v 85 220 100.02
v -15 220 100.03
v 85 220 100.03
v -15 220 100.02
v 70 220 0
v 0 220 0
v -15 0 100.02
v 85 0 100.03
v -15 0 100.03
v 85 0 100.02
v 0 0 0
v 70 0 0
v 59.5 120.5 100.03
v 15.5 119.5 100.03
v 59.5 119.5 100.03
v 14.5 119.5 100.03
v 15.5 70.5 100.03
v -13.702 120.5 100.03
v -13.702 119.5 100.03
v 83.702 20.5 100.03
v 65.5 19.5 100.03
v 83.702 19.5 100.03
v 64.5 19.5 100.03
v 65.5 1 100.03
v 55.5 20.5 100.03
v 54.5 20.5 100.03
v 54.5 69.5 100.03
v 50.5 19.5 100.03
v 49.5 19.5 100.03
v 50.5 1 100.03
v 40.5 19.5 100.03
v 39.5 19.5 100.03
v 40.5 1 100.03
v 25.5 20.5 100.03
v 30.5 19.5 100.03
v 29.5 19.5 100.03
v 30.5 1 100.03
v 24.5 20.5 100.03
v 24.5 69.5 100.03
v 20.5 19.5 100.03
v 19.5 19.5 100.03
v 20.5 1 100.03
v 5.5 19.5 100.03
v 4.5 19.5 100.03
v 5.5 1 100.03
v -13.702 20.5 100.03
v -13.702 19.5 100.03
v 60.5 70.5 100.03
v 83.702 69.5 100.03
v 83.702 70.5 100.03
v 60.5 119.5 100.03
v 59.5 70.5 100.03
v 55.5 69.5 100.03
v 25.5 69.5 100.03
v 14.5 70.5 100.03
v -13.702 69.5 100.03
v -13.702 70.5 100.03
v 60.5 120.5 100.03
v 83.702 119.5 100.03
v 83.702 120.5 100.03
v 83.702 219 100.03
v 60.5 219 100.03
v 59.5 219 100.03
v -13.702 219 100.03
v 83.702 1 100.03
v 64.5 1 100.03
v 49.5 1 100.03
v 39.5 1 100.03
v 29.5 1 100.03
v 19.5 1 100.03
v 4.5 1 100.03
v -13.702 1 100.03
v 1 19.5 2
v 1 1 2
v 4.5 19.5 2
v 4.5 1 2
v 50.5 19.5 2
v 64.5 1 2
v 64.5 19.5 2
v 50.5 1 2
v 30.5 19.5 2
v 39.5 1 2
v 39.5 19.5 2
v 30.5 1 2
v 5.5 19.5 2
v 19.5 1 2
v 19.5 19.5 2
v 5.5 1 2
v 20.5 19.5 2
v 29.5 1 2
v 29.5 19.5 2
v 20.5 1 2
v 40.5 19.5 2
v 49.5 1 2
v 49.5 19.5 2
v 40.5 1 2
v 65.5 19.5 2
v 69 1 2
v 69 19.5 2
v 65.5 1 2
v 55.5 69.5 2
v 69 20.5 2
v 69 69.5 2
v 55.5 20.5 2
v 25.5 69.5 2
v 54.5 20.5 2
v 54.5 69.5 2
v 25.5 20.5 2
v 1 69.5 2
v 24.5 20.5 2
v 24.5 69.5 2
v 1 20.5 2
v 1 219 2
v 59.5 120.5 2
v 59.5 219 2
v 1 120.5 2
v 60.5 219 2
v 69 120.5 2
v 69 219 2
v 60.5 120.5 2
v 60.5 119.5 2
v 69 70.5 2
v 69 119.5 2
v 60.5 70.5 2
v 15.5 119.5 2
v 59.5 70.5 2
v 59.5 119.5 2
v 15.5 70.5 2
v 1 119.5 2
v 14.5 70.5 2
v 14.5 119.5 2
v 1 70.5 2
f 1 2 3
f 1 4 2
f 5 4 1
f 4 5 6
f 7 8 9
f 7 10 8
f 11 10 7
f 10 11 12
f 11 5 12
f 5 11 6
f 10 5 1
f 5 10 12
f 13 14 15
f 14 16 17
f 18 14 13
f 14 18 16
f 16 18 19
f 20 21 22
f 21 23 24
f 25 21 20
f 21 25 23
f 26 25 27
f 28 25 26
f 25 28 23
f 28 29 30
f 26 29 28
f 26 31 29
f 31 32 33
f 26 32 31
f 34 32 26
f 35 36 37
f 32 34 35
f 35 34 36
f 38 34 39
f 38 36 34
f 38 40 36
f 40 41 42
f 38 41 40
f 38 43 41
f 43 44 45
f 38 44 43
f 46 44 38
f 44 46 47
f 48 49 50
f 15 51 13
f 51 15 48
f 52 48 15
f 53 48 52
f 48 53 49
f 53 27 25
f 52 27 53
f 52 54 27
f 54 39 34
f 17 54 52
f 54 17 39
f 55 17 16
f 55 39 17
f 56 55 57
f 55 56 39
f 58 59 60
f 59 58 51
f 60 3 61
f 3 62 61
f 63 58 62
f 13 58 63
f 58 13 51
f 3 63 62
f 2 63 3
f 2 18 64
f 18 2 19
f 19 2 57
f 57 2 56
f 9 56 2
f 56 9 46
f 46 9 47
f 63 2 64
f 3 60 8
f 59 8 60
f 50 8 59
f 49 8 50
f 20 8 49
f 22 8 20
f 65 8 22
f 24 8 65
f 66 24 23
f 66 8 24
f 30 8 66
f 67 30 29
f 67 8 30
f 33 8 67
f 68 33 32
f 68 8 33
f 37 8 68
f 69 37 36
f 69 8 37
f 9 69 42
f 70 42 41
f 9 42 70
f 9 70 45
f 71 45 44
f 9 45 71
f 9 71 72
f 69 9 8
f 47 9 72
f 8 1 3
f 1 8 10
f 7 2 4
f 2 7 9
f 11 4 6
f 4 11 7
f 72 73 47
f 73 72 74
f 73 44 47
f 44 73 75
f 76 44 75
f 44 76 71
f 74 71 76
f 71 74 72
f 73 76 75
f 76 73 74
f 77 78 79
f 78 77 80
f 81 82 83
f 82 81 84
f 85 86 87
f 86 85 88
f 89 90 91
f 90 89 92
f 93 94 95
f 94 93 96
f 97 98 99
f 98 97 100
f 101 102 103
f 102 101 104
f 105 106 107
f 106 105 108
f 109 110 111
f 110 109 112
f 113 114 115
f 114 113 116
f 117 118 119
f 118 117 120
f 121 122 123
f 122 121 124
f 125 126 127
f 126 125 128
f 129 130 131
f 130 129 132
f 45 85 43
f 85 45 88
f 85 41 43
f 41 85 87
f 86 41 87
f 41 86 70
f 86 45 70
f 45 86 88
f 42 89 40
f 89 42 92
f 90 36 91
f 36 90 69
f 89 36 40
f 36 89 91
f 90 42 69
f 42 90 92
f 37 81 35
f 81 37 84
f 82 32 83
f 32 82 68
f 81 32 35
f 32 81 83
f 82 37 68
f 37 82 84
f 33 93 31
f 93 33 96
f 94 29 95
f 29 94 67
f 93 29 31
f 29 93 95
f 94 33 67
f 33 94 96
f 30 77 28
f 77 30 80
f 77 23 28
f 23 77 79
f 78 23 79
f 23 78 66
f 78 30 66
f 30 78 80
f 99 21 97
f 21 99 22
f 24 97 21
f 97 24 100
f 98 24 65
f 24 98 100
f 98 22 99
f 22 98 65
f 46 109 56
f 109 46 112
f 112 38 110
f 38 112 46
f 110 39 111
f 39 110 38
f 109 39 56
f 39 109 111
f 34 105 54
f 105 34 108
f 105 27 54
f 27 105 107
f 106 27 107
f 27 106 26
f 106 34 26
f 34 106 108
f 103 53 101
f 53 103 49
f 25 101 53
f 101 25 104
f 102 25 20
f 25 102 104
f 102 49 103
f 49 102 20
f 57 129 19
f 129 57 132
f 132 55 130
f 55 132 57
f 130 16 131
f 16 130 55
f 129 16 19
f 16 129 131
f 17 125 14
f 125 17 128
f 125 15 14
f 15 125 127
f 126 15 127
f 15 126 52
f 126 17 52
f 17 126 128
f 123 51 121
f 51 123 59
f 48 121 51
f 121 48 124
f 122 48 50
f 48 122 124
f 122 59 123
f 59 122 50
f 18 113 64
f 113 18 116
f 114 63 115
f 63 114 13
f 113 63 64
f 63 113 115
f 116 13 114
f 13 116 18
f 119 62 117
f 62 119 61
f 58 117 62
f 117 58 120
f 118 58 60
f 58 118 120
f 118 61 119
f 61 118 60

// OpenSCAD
// file: caddy_organizer_divider_common.scad
overlap=0.01;

/*
 * separate h,w for top and bottom defines the taper
 * centering defines whether the extra on top or bottom extends fully in the positive direction,
 * or extends equally in both directions.
 * flip***Wise shifts the larger end (top or bottom) in the negative direction so it
 * doesn't need to be mirrored & shifted externally.
 * clipBottomHeight cuts off the lower part of the box up to the height specified
 */
module taperedBox(bw, tw, bl, tl, ht, centerWidthwise=true, centerLengthwise=true, 
        flipWidthwise=false, flipLengthwise=false,
        clipBottomHeight=0) {
    extraWidth = abs(tw-bw);
    extraLength = abs(tl-bl);
    widerWidth = max(tw,bw);
    longerLength = max(tl,bl);
    // Don't shift if not centered and not flipped.
    // When centered
    // When not centered and flipped, shift negative direction
    topWidthShift = ((centerWidthwise) ? -(extraWidth/2) : ((flipWidthwise) ? -extraWidth : 0));
    topLengthShift = ((centerLengthwise) ? -(extraLength/2) : ((flipLengthwise) ? -extraLength : 0));
    echo(str("topWidthShift=",topWidthShift,", topLengthShift=",topLengthShift));
    difference() {
        hull() {
            translate([0,0,0]) 
                cube([bw,bl,overlap]);
            translate([topWidthShift,topLengthShift,ht+overlap])
                cube([tw,tl,overlap]);
        }
        // clip off the bottom of the box (when used as a shallow cutout)        
        translate([-widerWidth/2,-longerLength,-overlap])
            cube([widerWidth*2,longerLength*2,clipBottomHeight+overlap]);
    }
}
// file: caddy_organizer_divider_v2.scad
/*
 * Different construction using dividerSpec directly.
 */
use <caddy_organizer_divider_common.scad>

module caddyOrganizerDividerV2(bottomThickness=2, wallThickness=1, 
        bottomWidth=50, topWidth=55,
        bottomLength=75, topLength=80,
        wallHeight=25,
        dividerSpec=[
            [0,[[25,0]]],
            [30, [[15,0],[30,0]]]
        ]) {
    difference() {
        // Start with outer box full depth including extra for bottom thickness
        taperedBox();
    }


}
// main file
use <caddy_organizer_divider.scad>
use <caddy_organizer_divider_v2.scad>

// longer, ~1/2 of the side pocket of the large aluminum bar handle caddy
bottomWidth=70;
topWidth=100;
wallHeight=100;
crosswaysDividerOffsets=[0,20,70,120];  // last one cuts the remainder to outerLength
lengthwiseSplits=[
    [0,5,20,30,40,50,65],[0,25,55],[0,15,60],[0,60]]; // same count as divider offsets - relative to bottomWidth
bottomLength=220;
topLength=220;

caddyOrganizerDivider(bottomWidth=bottomWidth, topWidth=topWidth, bottomLength=bottomLength, 
    topLength=topLength, wallHeight=wallHeight,crosswaysDividerOffsets=crosswaysDividerOffsets,
    lengthwiseSplits=lengthwiseSplits,allFullDepth=true);
